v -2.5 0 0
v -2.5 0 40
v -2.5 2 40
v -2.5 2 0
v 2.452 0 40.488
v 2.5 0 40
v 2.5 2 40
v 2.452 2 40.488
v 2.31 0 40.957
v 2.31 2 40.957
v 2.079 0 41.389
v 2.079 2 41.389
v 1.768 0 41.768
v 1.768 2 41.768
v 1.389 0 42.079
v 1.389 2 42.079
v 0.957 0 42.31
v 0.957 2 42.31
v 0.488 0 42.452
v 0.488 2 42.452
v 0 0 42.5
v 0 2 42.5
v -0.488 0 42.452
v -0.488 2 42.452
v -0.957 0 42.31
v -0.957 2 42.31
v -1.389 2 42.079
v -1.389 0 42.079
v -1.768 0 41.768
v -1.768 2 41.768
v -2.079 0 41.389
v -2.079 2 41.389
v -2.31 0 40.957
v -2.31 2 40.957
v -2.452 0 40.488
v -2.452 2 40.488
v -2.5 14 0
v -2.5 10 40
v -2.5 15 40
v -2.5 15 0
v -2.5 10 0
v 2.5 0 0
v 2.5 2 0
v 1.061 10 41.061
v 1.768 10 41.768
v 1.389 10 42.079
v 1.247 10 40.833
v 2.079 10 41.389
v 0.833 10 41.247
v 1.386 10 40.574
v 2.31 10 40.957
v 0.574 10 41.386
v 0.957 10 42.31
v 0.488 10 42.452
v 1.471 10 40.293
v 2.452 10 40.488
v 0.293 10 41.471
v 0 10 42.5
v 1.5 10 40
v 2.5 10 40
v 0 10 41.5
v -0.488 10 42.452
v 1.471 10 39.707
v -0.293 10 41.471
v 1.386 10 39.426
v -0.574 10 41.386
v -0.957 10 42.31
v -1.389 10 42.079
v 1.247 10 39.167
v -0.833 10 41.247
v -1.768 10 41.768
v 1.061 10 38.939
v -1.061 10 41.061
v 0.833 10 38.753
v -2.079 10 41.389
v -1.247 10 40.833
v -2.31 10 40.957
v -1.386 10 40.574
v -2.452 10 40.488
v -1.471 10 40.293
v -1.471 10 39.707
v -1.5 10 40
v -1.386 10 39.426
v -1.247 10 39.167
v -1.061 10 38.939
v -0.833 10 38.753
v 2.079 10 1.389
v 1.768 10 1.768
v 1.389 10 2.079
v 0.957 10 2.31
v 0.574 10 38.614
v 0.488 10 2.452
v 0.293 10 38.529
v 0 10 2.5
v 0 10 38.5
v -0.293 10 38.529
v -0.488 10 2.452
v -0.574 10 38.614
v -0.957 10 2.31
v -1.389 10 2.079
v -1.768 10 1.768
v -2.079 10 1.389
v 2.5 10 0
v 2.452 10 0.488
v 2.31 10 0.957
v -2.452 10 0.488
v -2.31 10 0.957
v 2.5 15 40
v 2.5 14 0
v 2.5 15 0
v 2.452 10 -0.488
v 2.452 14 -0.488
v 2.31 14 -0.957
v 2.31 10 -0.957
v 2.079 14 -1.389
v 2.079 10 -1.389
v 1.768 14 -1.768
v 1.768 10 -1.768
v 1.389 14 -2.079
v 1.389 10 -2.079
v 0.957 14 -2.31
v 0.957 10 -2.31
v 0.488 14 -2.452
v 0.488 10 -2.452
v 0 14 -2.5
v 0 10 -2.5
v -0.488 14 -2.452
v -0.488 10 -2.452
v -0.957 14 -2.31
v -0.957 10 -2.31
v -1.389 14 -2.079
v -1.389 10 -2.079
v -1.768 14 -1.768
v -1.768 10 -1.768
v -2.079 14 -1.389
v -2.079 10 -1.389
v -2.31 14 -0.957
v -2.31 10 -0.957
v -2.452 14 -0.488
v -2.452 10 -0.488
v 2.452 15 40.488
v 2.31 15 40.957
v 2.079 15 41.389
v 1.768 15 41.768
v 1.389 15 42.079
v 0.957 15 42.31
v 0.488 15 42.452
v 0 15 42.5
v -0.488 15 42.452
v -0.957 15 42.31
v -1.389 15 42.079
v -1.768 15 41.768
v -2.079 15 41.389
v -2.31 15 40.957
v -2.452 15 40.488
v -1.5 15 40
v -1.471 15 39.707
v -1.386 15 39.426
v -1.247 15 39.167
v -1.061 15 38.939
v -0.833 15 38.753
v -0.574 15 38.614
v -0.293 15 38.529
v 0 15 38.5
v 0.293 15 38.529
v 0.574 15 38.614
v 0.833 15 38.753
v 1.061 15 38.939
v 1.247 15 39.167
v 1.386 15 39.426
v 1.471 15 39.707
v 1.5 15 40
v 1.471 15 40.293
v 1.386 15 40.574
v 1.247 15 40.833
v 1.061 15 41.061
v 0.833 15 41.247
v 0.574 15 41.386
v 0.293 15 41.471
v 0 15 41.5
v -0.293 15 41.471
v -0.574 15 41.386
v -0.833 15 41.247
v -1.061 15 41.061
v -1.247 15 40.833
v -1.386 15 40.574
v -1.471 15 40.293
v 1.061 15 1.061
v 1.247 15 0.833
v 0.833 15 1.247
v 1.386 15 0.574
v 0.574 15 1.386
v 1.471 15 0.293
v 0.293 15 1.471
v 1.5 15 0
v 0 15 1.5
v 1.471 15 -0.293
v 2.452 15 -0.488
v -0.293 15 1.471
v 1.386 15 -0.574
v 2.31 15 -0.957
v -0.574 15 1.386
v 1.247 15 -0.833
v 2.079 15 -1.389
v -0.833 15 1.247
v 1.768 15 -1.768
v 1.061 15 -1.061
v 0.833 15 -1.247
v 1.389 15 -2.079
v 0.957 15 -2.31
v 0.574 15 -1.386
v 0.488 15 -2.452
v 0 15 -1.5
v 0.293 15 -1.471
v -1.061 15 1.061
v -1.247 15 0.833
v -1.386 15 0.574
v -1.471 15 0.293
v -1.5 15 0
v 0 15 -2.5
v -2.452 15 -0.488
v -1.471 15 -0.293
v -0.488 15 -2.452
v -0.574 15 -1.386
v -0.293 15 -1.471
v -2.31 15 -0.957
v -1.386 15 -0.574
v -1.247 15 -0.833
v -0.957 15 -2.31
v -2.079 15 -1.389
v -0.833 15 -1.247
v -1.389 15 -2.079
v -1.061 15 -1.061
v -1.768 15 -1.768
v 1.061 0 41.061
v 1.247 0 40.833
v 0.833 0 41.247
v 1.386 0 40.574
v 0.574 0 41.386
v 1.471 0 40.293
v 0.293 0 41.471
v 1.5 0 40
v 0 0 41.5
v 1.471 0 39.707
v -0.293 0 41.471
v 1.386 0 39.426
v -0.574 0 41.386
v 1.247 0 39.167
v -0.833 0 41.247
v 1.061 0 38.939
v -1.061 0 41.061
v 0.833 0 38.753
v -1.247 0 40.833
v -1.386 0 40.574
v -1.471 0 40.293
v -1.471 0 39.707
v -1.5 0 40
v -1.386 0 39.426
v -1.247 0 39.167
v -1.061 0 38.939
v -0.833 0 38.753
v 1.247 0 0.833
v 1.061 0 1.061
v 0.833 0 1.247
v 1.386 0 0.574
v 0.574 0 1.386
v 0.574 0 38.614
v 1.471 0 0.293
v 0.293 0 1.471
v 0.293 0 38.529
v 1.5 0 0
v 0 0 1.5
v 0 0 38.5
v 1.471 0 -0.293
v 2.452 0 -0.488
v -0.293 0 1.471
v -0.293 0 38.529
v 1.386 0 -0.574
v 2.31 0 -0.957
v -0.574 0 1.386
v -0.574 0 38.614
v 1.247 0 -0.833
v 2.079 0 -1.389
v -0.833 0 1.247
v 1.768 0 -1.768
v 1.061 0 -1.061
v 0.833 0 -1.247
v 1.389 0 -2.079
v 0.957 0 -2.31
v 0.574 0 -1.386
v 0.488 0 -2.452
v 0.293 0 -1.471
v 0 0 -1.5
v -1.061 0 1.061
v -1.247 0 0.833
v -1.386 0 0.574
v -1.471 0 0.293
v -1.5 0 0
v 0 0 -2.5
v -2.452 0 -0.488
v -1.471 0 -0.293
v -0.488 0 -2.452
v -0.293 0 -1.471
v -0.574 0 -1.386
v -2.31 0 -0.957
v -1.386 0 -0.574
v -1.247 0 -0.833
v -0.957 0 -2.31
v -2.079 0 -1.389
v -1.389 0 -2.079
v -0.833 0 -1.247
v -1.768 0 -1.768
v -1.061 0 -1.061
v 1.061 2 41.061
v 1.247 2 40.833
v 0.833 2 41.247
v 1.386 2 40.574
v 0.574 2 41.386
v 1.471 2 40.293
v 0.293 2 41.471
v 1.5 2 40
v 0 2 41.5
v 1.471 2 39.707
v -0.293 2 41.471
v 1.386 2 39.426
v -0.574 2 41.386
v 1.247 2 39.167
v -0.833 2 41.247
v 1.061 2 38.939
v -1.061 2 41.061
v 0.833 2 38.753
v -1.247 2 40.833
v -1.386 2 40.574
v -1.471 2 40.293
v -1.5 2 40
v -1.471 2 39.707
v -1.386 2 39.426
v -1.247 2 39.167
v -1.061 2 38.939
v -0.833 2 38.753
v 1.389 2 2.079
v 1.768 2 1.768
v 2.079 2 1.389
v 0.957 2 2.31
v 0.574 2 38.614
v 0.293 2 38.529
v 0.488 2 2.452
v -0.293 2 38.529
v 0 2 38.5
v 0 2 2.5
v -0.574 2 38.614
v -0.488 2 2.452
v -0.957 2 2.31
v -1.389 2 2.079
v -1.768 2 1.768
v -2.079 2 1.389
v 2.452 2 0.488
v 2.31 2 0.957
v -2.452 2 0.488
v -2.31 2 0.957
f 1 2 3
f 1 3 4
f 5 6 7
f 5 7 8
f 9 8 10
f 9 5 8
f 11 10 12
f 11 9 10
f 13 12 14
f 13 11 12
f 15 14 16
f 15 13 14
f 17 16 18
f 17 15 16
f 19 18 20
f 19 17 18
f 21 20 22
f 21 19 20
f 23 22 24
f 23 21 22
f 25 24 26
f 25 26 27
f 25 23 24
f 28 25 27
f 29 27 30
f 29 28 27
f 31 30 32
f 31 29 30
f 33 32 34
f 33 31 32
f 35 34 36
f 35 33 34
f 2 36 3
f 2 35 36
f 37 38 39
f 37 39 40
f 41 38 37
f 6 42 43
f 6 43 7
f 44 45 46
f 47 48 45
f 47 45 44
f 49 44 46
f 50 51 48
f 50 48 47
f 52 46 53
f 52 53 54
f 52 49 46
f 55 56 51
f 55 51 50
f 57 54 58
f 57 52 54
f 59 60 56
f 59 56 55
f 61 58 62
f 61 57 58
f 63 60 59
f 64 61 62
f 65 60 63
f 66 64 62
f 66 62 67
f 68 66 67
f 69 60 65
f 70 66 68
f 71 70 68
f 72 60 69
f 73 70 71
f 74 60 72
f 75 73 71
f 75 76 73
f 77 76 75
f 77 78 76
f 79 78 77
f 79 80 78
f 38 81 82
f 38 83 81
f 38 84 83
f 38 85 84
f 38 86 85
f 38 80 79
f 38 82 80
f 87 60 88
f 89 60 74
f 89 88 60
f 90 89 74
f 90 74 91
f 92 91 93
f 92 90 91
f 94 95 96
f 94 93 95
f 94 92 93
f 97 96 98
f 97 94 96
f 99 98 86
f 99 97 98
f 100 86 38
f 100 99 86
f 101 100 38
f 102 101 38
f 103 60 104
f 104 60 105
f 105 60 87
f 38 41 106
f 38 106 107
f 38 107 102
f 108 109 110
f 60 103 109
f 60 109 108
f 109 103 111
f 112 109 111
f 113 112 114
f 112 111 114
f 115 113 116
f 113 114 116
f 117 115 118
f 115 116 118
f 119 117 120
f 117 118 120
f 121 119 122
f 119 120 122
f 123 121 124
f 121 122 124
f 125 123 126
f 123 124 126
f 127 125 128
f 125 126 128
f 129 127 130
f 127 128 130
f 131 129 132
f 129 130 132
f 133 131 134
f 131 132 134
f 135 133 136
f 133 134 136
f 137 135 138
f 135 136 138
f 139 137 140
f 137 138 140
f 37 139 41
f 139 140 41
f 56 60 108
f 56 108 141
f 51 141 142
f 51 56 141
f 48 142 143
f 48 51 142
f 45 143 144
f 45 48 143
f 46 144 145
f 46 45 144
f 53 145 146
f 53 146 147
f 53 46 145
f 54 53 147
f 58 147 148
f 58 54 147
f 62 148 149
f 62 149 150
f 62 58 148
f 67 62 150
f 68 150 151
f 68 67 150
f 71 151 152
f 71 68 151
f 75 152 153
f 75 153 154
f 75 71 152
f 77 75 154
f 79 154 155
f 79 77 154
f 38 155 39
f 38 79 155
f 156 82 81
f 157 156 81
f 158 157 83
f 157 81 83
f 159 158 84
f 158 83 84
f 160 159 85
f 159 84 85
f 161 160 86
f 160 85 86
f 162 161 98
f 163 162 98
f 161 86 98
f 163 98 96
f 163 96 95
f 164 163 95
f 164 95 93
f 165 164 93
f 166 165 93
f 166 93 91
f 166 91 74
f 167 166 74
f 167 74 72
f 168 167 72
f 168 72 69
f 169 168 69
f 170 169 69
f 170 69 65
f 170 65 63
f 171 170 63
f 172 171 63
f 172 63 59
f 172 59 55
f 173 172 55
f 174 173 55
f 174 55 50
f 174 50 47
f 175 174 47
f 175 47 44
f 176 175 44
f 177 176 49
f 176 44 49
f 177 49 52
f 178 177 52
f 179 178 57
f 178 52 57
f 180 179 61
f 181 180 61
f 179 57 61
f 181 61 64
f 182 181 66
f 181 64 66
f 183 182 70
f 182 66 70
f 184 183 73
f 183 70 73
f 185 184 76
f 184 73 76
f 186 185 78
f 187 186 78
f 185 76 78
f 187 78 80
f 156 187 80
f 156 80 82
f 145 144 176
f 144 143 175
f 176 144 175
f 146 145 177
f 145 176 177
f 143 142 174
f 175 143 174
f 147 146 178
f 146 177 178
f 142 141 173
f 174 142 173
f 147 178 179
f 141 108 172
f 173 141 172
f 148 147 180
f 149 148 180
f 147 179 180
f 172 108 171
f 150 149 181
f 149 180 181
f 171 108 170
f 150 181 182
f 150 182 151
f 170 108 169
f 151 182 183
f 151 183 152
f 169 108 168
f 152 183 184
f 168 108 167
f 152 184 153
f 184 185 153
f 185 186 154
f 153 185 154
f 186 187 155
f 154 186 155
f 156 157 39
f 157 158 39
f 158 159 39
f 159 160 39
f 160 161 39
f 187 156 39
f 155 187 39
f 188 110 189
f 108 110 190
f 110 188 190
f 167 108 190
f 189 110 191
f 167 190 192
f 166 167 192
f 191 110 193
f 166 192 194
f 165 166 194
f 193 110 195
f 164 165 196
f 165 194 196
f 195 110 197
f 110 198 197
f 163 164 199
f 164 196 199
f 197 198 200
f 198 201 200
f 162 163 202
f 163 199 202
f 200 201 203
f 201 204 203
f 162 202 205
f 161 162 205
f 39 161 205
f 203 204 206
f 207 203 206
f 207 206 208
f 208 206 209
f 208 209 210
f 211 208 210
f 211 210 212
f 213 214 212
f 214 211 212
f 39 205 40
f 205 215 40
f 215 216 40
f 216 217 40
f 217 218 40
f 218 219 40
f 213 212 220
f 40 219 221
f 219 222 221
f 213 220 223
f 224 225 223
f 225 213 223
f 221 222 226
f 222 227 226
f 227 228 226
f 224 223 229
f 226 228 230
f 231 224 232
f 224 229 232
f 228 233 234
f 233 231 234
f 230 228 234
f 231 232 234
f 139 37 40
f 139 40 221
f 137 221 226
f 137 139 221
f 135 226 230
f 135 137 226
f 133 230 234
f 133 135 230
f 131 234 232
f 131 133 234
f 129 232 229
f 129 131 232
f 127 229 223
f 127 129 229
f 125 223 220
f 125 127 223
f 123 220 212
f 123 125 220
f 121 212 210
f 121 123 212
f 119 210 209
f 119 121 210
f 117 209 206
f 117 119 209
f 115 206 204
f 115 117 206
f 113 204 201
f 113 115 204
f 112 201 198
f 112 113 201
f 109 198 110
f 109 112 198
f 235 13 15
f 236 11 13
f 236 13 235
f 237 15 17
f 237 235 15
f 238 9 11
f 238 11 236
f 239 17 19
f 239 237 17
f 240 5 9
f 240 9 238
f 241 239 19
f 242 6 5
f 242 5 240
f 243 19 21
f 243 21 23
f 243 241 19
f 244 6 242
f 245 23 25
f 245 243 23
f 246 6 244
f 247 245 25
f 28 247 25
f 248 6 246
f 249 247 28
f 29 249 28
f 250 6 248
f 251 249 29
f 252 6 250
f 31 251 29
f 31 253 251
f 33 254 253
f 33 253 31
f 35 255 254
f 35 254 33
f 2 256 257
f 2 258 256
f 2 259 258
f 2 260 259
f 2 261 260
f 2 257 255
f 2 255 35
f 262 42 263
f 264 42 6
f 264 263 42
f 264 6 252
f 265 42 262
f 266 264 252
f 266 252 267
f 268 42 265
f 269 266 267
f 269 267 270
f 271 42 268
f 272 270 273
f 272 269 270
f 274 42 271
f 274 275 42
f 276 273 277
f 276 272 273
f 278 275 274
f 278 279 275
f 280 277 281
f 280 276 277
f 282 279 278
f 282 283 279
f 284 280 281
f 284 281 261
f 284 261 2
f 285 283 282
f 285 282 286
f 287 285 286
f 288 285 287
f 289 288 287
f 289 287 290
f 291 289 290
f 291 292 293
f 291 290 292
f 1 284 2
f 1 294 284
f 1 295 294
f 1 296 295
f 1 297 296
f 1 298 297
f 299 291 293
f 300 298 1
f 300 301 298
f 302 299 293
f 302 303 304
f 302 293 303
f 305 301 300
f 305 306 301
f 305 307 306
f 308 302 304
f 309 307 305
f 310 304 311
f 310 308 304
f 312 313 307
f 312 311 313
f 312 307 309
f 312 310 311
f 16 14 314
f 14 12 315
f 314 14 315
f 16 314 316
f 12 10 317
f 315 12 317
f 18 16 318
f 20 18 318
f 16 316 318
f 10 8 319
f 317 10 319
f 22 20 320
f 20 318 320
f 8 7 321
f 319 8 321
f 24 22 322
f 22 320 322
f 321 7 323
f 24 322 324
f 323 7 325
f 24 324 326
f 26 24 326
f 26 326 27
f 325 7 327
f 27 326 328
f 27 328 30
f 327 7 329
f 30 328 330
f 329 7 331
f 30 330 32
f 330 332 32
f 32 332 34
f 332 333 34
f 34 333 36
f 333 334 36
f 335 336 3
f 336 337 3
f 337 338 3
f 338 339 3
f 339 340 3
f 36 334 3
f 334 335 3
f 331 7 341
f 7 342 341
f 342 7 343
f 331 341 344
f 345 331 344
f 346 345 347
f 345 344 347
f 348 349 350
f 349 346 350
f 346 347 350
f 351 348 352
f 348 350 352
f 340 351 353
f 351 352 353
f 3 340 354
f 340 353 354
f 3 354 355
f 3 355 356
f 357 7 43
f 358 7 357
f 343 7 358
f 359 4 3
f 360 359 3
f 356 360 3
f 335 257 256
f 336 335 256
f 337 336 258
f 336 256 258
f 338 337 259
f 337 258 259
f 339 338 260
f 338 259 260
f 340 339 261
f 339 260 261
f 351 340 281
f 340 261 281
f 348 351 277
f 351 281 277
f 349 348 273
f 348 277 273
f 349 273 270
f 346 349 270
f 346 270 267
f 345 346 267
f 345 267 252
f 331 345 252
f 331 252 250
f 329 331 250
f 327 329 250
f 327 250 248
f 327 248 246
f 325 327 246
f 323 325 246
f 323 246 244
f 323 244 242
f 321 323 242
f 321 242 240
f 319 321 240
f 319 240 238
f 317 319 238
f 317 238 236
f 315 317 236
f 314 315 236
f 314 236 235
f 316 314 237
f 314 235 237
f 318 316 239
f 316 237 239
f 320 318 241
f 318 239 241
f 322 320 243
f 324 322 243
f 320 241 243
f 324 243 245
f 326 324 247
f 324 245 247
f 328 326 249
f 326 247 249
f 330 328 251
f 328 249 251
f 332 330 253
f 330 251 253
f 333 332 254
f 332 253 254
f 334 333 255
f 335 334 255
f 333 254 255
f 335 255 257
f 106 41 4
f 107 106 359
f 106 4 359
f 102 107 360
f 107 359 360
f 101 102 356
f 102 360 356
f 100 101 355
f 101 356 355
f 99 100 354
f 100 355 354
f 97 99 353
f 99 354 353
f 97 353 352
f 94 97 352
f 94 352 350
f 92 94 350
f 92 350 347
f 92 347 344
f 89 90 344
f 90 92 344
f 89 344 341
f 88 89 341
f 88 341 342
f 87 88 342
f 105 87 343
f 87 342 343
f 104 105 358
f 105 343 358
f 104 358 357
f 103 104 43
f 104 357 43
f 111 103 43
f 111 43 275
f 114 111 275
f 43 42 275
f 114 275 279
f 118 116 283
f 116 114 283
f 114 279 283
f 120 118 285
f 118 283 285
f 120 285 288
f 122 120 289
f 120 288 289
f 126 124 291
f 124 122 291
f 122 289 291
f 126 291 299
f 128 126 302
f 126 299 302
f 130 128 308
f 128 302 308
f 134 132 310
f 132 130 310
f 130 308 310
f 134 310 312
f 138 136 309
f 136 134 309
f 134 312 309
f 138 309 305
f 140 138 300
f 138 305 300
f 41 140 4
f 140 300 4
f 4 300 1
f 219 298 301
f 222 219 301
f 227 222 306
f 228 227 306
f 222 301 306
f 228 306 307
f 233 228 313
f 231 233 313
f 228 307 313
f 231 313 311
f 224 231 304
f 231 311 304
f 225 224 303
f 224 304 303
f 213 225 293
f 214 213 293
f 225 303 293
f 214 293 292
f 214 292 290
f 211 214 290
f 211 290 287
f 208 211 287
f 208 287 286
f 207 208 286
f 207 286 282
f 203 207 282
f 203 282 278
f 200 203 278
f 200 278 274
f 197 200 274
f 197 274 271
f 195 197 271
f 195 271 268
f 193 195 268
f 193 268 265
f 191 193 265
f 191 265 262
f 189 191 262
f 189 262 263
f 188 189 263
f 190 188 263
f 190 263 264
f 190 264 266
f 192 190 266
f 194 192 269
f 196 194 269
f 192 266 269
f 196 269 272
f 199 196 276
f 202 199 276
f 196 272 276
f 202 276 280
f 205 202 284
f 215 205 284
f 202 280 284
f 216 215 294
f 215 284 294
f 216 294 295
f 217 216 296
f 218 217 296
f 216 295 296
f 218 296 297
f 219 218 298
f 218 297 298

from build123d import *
from build123d.topology import SkipClean

# Parameters (mm, degrees)
BOSS_EXTRUDE1_DEPTH             = 2
SKETCH2_R                       = 2.5
BOSS_EXTRUDE2_DEPTH             = 12
BOSS_EXTRUDE3_START             = 10
BOSS_EXTRUDE3_DEPTH             = 5
F_3_0MM_CLEARANCE_DOWEL_HOLE1_D = 3


with BuildPart() as part:
    # Sketch1 → Boss-Extrude1 (new body)
    with BuildSketch(Plane(origin=(0, 0, 0), x_dir=(1, 0, 0), z_dir=(0, 1, 0))):
        with BuildLine():
            Line((2.5, 0), (2.5, -40))
            ThreePointArc((2.5, -40), (0, -42.5), (-2.5, -40))
            Line((-2.5, -40), (-2.5, 0))
            ThreePointArc((-2.5, 0), (0, 2.5), (2.5, 0))
        make_face()
    extrude(amount=BOSS_EXTRUDE1_DEPTH)

    # Sketch2 → Boss-Extrude2 (add)
    with SkipClean():  # the faces are left unmerged after this step: merging them gives an invalid solid
        with BuildSketch(Plane(origin=(0, 2, 0), x_dir=(1, 0, 0), z_dir=(0, 1, 0))):
            Circle(SKETCH2_R)
        extrude(amount=BOSS_EXTRUDE2_DEPTH)
    add(part.part.scale(1), mode=Mode.REPLACE)  # the faces are merged on a copy

    # Sketch1<3> → Boss-Extrude3 (add)
    with BuildSketch(Plane(origin=(0, 0, 0), x_dir=(1, 0, 0), z_dir=(0, 1, 0)).offset(BOSS_EXTRUDE3_START)):
        with BuildLine():
            Line((2.5, 0), (2.5, -40))
            ThreePointArc((2.5, -40), (0, -42.5), (-2.5, -40))
            Line((-2.5, -40), (-2.5, 0))
            ThreePointArc((-2.5, 0), (0, 2.5), (2.5, 0))
        make_face()
    extrude(amount=BOSS_EXTRUDE3_DEPTH)

    # Ø3.0mm Clearance Dowel Hole1 (through all)
    with Locations(Plane(origin=(0, 15, 0), x_dir=(1, 0, 0), z_dir=(0, 1, 0))):
        with Locations((0, 0), (0, -40)):
            Hole(F_3_0MM_CLEARANCE_DOWEL_HOLE1_D / 2)


solid = part.part
